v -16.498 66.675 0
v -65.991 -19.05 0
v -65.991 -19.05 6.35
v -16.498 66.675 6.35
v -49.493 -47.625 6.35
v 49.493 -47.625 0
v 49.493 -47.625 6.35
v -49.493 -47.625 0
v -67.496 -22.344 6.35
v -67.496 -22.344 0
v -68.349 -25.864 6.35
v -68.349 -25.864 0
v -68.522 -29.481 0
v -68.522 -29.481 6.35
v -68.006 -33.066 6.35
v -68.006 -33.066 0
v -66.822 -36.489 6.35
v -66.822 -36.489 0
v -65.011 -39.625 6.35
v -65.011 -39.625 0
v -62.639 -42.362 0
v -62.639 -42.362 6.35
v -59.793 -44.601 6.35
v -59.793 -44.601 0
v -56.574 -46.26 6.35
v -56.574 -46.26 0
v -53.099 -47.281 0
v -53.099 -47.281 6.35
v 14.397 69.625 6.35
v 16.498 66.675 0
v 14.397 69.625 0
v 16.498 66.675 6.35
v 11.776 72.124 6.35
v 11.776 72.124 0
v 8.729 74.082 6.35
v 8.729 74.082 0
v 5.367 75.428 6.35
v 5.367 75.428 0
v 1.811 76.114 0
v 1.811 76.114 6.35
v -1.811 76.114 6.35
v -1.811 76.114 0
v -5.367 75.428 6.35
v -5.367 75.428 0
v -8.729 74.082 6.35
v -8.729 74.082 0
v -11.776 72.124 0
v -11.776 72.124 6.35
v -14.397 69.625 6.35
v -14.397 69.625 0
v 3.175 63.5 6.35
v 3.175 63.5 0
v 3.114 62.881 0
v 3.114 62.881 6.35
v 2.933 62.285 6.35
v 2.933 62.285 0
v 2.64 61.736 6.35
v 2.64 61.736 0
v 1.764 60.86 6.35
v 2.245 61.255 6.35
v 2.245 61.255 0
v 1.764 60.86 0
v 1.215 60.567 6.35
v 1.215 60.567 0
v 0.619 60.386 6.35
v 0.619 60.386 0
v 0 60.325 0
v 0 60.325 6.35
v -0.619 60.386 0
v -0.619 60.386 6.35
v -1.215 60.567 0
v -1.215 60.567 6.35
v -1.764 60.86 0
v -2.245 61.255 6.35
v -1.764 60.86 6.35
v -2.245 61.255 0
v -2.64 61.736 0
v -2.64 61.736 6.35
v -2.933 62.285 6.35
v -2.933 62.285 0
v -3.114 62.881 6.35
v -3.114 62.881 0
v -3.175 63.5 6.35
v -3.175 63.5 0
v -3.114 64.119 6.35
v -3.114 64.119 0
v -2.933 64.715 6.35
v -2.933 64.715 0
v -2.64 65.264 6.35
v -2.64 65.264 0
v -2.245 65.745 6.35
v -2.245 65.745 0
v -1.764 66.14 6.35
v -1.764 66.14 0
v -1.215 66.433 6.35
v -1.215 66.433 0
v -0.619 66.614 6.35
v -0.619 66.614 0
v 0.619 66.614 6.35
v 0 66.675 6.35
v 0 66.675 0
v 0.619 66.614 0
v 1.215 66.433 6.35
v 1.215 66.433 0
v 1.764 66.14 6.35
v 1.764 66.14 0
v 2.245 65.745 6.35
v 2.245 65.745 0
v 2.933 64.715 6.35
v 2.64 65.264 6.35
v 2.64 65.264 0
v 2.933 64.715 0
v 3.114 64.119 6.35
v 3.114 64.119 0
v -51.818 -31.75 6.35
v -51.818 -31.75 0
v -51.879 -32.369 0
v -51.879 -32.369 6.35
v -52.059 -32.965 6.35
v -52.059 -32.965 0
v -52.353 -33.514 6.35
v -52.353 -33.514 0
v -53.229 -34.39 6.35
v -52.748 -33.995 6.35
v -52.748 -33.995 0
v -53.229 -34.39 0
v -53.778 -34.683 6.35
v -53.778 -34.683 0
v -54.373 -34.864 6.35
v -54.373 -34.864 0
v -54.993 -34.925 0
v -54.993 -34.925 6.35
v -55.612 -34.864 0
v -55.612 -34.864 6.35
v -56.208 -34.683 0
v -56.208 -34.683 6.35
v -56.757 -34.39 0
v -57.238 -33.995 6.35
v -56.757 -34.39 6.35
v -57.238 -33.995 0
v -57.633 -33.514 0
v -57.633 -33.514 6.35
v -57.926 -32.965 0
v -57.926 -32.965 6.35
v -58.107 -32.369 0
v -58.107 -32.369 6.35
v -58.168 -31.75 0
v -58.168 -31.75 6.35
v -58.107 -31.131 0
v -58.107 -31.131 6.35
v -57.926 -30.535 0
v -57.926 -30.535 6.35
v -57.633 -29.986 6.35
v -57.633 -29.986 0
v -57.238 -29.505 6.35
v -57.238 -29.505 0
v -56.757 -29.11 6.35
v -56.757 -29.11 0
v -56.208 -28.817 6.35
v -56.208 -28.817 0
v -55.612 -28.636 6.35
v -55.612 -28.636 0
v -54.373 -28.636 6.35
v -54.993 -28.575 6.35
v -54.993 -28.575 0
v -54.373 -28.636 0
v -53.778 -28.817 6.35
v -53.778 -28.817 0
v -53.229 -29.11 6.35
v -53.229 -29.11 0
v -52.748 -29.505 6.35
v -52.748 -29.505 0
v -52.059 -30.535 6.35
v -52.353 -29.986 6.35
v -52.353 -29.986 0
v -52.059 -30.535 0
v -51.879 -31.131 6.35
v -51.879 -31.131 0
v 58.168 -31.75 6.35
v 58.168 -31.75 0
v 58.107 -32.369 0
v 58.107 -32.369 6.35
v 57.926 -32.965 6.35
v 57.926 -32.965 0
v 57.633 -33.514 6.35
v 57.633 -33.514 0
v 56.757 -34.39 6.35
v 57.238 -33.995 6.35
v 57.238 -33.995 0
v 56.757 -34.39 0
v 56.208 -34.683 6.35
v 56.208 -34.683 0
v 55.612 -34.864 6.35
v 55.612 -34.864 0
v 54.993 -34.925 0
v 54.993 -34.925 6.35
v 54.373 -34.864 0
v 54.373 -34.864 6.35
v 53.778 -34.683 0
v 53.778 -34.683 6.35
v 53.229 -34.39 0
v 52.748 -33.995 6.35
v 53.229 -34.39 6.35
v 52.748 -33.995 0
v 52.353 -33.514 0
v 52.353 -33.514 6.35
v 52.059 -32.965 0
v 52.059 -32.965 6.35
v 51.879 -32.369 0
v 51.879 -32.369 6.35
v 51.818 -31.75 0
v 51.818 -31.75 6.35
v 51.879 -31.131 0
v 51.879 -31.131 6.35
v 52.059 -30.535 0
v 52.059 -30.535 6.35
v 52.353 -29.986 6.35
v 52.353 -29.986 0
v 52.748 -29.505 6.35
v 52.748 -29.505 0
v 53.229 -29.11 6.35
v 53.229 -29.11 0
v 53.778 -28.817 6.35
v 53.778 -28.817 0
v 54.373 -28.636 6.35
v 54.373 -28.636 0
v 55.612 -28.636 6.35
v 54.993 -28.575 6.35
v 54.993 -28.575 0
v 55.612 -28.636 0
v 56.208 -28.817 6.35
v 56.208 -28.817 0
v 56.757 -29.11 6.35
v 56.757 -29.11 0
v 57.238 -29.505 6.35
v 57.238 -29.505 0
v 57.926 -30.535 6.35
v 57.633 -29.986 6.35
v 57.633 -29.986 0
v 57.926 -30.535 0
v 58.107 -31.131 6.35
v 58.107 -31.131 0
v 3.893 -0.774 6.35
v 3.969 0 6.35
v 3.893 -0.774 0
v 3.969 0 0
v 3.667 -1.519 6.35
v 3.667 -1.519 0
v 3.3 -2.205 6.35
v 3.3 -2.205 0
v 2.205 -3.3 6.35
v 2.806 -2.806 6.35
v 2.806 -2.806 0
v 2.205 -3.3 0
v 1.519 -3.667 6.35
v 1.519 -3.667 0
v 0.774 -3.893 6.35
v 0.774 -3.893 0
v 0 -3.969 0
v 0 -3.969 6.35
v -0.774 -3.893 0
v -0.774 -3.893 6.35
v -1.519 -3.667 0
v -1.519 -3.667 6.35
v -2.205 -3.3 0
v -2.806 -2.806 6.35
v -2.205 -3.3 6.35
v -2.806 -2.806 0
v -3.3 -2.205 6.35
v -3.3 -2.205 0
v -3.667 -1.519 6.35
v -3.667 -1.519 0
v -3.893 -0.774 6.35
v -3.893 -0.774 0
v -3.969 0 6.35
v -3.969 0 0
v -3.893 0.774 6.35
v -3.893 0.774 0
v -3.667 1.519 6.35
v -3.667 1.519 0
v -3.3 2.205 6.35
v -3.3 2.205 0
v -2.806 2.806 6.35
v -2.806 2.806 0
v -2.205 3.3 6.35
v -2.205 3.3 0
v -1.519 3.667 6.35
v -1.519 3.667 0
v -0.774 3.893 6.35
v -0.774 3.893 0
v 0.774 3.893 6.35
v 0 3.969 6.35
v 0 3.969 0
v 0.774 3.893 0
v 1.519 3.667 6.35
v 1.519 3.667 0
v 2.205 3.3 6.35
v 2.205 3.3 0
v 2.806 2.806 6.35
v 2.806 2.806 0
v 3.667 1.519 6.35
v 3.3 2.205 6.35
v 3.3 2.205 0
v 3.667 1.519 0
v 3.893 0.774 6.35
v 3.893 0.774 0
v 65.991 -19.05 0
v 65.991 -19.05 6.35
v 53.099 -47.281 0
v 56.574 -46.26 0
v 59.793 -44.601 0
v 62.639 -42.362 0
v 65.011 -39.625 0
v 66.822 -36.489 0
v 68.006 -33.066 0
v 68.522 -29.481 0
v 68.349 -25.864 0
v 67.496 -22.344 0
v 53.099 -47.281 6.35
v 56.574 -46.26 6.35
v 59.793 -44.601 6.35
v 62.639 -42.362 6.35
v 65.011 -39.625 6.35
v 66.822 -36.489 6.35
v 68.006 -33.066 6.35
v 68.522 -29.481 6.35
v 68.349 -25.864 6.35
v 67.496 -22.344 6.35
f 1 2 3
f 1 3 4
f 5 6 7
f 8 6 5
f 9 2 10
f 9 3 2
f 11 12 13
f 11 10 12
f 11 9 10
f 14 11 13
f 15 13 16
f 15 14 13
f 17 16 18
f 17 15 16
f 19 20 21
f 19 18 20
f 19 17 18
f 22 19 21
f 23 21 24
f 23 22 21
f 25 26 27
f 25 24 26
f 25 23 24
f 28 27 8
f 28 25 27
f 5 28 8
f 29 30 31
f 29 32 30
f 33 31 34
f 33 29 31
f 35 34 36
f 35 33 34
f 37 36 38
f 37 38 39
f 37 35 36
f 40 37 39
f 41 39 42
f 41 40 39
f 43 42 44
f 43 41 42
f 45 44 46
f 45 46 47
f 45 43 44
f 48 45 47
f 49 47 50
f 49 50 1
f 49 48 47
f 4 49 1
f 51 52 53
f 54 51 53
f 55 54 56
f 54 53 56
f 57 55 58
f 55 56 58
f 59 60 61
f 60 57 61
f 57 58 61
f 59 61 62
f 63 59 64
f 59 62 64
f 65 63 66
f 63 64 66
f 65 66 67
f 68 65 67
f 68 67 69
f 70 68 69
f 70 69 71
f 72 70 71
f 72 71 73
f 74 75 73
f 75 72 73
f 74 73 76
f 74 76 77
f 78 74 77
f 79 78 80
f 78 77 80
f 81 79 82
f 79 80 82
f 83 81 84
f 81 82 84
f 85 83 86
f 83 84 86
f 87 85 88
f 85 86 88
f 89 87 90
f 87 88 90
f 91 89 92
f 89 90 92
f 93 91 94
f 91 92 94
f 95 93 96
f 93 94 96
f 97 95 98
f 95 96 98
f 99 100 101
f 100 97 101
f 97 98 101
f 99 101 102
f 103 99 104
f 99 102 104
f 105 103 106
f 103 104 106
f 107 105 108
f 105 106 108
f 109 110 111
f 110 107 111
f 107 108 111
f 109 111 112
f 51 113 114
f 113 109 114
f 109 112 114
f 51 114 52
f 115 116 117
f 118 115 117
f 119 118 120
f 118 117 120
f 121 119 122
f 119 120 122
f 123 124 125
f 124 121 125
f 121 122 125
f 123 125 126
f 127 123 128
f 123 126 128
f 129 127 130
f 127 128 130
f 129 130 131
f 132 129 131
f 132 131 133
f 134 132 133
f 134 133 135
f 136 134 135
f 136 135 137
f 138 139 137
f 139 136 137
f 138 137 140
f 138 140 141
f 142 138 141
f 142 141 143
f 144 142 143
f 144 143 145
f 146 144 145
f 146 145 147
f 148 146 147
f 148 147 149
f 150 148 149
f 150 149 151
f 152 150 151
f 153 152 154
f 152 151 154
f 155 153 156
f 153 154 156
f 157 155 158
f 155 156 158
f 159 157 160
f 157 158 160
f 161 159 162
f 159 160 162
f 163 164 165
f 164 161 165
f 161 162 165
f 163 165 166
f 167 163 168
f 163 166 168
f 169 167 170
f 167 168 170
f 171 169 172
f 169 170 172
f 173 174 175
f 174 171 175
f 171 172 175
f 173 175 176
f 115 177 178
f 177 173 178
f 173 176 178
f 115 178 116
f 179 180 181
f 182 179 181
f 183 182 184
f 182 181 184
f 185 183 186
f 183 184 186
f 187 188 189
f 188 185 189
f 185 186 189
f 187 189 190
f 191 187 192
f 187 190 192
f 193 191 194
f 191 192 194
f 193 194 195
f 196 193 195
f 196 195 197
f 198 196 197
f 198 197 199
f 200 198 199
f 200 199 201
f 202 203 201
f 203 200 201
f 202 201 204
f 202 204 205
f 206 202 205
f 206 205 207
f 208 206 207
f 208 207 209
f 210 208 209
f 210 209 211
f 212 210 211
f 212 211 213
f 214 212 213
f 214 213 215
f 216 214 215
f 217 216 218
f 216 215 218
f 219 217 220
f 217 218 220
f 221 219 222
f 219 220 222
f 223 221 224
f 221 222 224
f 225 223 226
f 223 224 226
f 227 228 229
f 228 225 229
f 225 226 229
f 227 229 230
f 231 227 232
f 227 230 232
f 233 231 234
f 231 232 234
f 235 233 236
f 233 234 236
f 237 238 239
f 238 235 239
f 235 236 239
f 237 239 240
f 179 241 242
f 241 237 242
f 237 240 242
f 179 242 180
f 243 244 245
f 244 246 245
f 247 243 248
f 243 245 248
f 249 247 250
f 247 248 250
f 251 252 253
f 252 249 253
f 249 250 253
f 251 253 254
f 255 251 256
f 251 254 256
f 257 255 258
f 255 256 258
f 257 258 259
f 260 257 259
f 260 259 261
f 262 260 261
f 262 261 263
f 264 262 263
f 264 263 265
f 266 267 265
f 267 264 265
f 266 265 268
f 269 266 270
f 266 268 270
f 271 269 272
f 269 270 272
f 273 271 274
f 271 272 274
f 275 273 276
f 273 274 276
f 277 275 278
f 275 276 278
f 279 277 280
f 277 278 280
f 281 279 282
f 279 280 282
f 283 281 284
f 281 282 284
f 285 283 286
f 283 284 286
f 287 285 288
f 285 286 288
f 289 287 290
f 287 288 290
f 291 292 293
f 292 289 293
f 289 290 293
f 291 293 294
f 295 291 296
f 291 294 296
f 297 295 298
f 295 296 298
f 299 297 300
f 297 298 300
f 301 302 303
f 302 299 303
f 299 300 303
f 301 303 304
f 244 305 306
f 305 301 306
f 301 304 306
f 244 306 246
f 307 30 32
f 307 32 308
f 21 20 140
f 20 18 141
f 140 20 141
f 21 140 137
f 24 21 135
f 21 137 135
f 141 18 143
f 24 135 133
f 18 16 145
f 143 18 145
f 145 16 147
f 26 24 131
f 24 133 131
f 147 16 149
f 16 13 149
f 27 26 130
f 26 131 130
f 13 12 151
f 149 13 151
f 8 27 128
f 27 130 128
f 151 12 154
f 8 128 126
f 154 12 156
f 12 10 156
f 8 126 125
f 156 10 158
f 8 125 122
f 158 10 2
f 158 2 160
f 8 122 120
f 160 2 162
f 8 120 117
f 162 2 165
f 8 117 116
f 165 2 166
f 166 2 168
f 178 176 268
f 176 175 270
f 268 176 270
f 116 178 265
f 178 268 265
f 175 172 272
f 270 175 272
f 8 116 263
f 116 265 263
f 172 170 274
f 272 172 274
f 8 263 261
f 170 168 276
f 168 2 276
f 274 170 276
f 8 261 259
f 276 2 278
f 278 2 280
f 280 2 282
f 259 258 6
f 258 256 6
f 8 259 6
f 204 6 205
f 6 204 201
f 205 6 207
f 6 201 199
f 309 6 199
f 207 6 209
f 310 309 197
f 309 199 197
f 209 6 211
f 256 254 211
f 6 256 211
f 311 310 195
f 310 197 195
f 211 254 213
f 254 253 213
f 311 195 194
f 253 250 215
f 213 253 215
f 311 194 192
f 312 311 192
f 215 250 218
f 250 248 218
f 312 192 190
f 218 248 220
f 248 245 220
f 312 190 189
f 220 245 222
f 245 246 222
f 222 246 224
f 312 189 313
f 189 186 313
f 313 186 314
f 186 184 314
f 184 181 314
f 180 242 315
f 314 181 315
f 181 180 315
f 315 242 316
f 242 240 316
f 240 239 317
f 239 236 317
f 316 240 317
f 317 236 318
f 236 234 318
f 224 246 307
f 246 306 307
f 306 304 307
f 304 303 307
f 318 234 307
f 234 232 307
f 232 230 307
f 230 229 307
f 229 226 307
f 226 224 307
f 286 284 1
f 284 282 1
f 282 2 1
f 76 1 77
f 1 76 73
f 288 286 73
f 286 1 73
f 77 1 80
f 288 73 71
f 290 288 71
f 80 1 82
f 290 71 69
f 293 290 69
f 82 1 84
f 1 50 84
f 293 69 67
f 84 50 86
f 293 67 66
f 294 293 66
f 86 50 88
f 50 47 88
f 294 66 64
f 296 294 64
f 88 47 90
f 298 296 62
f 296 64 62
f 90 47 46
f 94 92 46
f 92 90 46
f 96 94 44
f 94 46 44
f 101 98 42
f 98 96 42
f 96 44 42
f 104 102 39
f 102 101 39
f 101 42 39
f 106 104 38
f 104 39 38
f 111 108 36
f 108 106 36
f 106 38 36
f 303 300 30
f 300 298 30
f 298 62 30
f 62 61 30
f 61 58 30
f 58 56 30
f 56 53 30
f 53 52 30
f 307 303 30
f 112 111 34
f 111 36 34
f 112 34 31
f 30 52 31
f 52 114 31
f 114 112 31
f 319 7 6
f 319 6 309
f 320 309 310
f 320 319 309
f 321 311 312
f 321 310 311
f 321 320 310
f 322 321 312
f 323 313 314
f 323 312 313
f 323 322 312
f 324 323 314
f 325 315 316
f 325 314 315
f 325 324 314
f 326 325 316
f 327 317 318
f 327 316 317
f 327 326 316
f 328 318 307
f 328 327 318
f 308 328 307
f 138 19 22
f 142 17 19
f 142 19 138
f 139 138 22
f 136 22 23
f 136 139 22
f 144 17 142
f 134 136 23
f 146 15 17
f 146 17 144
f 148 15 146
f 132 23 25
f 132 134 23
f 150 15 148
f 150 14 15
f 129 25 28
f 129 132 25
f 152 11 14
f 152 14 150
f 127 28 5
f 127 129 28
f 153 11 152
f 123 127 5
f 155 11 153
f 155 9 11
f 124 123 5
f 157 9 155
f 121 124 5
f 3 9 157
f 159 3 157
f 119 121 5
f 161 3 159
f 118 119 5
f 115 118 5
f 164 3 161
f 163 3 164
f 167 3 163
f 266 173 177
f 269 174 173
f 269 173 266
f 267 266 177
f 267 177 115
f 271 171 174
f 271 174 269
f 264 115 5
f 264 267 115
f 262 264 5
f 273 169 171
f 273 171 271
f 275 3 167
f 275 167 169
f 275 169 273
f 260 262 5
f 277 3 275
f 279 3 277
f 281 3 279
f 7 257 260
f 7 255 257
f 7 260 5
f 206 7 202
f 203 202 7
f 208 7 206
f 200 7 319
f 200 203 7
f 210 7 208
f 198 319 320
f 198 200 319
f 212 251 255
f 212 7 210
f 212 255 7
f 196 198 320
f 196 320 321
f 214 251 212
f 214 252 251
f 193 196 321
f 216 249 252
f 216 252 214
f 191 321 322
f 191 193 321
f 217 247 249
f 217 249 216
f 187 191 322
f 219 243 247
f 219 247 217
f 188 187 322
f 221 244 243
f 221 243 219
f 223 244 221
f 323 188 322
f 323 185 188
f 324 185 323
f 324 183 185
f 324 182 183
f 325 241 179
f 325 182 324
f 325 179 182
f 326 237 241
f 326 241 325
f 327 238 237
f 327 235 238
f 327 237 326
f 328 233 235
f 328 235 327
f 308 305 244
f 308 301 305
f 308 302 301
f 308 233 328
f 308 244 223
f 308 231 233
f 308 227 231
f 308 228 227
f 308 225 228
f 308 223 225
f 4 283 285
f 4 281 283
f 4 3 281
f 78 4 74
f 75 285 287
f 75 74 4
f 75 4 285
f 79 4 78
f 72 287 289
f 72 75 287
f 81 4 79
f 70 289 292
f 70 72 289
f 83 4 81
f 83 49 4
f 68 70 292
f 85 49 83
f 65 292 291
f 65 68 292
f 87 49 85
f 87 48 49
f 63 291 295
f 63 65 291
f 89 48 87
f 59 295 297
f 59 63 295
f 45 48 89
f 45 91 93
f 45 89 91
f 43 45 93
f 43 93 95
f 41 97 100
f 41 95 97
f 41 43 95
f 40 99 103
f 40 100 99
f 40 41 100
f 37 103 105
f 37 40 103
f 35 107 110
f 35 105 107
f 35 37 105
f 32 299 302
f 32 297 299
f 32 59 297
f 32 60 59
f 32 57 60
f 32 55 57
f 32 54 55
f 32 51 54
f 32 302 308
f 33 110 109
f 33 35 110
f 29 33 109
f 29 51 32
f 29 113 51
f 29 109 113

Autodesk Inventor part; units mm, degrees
ref_plane "YZ Plane" through (0, 0, 0) normal (1, 0, 0) x (0, 1, 0)
ref_plane "XZ Plane" through (0, 0, 0) normal (0, 1, 0) x (-1, 0, 0)
ref_plane "XY Plane" through (0, 0, 0) normal (0, 0, 1) x (1, 0, 0)
sketch "Sketch2" plane through (0, 0, 0) normal (0, 0, 1) x (1, 0, 0)
  circle A0 centre (0, 0) radius 3.9688
  circle A1 centre (0, 63.5) radius 3.175
  circle A2 centre (-54.9926, -31.75) radius 3.175
  circle A3 centre (54.9926, -31.75) radius 3.175
  line L0 (0, 69.85) -> (60.4919, -34.925) construction
  line L1 (60.4919, -34.925) -> (-60.4919, -34.925) construction
  line L2 (-60.4919, -34.925) -> (0, 69.85) construction
  line L3 (0, 95.25) -> (82.4889, -47.625)
  line L4 (82.4889, -47.625) -> (-82.4889, -47.625)
  line L5 (-82.4889, -47.625) -> (0, 95.25)
  dimension "d0" = 7.9375
  dimension "d1" = 6.35
  dimension "d2" = 63.5
  dimension "d5" = 360
  dimension "d8" = 12.7
  dimension "d9" = 12.7
  dimension "d10" = 12.7
extrude "Extrusion1" add sketch "Sketch2" along normal blind 6.35
fillet "Fillet1" radius 19.05 3 edges at (0, 95.25, 3.175) (-82.4889, -47.625, 3.175) (82.4889, -47.625, 3.175)
properties part number "Triangle-5-16-hole"
